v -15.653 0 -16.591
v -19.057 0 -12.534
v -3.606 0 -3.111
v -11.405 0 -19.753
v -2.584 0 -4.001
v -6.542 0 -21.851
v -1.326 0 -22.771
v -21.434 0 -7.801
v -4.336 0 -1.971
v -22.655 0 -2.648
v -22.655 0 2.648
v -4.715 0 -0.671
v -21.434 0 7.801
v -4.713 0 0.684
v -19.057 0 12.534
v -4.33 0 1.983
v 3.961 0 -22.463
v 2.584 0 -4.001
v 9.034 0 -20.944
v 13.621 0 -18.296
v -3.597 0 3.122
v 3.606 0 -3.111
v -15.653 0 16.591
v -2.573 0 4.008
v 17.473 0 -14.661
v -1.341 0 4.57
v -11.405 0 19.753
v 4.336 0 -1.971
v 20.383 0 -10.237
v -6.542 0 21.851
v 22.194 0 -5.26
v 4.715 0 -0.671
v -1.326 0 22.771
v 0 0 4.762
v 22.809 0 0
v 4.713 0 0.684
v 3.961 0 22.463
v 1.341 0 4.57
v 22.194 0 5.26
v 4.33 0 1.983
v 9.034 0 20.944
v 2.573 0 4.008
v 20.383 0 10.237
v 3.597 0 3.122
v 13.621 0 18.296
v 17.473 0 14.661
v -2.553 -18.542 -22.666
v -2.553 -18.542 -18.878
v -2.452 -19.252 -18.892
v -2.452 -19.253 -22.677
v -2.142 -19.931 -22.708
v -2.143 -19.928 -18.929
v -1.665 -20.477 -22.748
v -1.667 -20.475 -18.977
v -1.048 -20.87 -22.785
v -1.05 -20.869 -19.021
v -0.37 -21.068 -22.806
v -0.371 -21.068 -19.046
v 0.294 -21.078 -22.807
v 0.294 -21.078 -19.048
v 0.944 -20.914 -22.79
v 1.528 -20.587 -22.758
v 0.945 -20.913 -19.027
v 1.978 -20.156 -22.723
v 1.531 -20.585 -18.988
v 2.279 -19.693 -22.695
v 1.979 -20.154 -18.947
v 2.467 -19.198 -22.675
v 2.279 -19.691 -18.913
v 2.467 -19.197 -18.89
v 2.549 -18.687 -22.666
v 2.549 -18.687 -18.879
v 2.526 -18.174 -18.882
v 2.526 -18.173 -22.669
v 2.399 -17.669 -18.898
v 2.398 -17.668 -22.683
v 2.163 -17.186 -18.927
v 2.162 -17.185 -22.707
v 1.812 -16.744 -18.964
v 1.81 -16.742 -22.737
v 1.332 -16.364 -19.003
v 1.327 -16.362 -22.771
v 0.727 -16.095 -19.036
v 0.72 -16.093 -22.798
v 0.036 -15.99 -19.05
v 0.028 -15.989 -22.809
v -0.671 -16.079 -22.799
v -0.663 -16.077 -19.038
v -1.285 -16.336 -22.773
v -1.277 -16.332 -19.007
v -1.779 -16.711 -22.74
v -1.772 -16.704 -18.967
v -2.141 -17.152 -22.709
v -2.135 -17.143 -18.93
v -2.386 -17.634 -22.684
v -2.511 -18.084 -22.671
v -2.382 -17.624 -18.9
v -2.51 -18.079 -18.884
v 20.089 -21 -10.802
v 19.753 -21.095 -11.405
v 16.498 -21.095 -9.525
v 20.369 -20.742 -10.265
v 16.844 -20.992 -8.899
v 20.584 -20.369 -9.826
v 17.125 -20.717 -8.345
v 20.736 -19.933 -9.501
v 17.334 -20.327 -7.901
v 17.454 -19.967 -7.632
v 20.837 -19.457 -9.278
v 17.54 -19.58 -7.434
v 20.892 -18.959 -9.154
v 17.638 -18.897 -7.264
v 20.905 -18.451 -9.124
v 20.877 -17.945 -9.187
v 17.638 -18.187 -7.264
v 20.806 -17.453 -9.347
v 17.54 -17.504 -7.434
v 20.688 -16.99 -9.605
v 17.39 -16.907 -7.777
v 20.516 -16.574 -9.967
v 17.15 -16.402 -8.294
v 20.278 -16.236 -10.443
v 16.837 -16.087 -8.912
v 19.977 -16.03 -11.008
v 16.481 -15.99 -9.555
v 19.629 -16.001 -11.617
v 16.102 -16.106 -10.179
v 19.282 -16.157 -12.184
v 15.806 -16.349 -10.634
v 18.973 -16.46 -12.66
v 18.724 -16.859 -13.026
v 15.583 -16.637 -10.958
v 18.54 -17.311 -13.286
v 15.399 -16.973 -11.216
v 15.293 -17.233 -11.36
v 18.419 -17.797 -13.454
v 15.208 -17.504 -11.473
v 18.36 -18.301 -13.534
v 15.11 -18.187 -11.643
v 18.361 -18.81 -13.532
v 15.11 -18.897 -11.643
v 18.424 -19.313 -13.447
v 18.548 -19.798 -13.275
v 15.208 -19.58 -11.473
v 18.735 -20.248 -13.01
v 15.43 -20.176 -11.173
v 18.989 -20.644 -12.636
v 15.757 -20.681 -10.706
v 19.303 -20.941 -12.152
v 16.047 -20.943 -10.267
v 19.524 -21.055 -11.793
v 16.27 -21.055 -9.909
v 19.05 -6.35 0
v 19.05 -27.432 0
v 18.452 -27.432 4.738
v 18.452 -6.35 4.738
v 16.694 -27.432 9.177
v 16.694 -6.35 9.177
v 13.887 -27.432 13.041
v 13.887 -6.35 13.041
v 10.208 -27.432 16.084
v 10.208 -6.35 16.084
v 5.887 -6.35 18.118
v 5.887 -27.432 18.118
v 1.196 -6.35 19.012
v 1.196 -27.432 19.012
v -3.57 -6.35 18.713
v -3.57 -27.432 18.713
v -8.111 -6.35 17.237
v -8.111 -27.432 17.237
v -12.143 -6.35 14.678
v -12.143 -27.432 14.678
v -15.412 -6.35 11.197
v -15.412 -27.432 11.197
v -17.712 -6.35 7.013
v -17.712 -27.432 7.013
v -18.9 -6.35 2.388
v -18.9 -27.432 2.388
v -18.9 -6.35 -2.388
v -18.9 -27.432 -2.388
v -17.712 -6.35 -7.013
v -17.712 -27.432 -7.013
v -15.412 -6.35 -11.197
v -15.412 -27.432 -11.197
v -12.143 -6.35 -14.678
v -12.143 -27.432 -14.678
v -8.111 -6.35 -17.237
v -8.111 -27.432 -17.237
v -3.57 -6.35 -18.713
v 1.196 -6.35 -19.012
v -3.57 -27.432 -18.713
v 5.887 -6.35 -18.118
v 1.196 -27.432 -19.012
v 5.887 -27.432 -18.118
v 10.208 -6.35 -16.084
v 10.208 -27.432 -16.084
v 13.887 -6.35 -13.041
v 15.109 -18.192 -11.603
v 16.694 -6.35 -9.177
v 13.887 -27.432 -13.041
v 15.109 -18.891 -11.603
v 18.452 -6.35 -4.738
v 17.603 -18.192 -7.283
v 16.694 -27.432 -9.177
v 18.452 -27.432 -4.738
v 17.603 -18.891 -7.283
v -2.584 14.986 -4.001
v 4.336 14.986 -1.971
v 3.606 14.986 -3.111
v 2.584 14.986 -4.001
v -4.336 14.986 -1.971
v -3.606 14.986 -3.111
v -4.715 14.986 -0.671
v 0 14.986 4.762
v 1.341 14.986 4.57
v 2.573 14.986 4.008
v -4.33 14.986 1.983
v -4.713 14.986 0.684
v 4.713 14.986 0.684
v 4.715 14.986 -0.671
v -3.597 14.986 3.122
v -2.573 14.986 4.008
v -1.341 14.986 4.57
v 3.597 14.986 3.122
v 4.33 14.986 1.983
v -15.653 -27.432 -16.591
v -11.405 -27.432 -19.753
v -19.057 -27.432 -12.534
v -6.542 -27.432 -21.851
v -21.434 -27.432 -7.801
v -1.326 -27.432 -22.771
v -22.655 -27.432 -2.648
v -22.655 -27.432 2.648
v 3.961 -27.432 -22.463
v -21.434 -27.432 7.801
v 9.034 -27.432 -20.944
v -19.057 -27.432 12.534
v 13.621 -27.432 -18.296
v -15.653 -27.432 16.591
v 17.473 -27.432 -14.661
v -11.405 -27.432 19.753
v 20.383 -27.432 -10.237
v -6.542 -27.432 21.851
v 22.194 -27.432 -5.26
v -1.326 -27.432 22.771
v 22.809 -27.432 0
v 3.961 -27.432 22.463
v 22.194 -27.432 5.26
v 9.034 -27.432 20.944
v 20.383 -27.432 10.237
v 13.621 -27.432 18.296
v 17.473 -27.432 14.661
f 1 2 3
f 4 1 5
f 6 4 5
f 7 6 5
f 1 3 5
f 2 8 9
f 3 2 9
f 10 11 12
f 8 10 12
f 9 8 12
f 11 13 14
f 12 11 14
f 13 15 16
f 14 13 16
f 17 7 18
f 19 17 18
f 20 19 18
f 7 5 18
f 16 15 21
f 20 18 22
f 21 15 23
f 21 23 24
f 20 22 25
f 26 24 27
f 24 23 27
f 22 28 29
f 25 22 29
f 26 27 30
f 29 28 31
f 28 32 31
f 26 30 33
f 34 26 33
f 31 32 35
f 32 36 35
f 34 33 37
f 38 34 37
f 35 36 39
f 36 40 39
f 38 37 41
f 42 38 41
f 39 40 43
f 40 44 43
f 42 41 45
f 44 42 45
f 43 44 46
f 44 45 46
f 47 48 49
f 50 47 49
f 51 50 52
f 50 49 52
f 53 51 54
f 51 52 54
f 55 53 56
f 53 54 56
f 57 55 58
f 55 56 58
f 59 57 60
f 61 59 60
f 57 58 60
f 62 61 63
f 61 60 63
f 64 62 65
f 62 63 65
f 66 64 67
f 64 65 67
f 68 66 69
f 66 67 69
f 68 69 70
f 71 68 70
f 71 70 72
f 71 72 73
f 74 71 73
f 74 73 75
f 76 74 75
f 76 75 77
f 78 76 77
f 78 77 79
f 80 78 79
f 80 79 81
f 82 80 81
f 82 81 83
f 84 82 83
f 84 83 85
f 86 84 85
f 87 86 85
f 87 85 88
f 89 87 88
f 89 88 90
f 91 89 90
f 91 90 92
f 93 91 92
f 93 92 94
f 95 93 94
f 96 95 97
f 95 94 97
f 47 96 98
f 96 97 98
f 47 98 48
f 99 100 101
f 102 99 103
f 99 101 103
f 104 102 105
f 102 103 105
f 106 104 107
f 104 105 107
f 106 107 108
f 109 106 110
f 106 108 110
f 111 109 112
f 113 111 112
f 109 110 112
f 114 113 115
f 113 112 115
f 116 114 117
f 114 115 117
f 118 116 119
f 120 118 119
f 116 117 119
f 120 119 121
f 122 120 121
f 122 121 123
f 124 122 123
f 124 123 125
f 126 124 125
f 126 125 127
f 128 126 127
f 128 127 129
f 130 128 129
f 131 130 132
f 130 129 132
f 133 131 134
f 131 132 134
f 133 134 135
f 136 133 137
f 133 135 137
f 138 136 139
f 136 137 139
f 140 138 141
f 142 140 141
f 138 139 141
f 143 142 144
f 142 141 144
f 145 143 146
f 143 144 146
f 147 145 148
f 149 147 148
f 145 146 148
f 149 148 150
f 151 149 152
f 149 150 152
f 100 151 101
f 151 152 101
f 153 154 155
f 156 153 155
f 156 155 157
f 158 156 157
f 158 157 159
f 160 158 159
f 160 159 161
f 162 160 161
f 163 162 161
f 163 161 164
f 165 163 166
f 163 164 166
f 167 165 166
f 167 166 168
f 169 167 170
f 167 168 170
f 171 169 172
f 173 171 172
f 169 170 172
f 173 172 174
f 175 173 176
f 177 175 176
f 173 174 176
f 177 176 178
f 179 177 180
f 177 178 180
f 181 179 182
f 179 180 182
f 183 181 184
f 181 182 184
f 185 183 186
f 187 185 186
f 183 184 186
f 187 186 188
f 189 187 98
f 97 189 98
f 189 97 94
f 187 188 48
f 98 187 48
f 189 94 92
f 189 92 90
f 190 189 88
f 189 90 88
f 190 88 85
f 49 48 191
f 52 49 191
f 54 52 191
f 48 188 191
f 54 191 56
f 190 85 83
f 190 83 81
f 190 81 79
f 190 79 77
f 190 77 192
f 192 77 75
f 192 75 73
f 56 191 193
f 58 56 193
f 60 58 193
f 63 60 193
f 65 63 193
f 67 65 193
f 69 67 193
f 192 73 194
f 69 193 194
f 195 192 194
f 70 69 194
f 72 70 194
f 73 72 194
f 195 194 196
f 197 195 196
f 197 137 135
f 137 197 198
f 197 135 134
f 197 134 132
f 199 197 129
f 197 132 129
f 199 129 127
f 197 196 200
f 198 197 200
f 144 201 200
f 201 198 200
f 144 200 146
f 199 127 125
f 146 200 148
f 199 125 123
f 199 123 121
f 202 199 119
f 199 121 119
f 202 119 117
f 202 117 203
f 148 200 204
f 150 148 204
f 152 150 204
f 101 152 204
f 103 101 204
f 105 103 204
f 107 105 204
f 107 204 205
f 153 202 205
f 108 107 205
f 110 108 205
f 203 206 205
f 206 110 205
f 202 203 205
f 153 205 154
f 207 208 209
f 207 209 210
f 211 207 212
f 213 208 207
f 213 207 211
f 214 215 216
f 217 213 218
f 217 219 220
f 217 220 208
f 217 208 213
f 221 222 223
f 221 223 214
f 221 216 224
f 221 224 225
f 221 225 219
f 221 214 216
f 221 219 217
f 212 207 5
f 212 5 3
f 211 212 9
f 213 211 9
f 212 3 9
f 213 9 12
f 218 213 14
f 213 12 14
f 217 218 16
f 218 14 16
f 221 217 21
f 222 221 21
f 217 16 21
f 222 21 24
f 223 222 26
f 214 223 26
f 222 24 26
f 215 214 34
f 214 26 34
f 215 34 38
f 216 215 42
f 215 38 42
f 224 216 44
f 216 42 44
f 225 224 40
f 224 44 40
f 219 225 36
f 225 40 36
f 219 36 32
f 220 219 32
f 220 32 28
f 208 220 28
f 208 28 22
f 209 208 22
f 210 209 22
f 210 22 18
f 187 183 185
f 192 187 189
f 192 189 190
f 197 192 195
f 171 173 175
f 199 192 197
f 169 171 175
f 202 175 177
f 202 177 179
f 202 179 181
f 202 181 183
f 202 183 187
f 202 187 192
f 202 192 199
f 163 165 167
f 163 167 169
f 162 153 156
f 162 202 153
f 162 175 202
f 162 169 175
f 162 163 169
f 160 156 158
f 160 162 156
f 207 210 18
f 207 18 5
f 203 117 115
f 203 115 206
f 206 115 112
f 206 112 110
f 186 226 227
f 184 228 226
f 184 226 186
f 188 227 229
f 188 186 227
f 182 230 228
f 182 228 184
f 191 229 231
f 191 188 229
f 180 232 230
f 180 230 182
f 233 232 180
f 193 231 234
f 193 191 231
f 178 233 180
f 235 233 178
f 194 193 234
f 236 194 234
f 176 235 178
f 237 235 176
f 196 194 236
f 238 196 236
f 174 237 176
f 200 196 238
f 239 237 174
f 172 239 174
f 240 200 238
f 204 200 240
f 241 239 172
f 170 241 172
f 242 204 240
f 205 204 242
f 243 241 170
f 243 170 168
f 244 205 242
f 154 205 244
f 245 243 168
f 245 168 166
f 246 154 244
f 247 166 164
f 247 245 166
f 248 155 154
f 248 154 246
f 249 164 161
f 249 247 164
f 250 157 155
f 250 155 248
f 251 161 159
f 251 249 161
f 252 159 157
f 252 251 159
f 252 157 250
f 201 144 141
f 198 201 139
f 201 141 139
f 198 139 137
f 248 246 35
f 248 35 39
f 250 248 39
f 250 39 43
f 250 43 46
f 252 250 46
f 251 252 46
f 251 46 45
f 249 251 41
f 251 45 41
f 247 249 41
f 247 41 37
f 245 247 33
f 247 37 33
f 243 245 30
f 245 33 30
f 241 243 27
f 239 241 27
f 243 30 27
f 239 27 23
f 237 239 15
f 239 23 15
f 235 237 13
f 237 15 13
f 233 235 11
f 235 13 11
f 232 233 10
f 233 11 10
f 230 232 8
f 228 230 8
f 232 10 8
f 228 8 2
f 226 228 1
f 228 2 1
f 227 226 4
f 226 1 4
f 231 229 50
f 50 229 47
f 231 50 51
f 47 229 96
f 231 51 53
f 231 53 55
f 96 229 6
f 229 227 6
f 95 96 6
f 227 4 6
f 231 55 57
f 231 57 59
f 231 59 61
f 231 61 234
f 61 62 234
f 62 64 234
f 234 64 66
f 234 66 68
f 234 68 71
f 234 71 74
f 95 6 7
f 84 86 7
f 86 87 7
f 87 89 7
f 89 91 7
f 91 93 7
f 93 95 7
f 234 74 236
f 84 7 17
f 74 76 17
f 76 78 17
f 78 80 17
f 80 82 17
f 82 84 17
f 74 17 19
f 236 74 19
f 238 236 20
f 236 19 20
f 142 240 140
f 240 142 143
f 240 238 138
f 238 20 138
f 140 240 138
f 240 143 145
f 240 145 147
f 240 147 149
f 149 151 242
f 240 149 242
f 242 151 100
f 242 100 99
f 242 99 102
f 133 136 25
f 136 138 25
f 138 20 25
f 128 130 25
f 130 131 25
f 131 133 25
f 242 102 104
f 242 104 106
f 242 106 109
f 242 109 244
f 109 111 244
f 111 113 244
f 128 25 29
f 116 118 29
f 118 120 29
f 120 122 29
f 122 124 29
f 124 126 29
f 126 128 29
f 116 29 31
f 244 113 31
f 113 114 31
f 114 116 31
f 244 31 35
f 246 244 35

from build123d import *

# Parameters (mm, degrees)
F0_R      = 22.8092
F1_DEPTH  = 27.432
F3_DEPTH  = 14.986
F4_R      = 19.05
F5_DEPTH  = 21.082
F8_D      = 5.1054
F8_DEPTH  = 7.5692
F8_START  = 0.1432934
F8_TIP    = 1.5338169022
F12_D     = 5.1054
F12_DEPTH = 3.7592
F12_START = 0.1432934
F12_TIP   = 1.5338169022


with BuildPart() as f1:
    # F0 (on Front) → F1 (new body)
    with BuildSketch(Plane.XZ):
        Circle(F0_R)
    extrude(amount=F1_DEPTH)

    # F2 (on face) → F3 (join)
    with BuildSketch(Plane(origin=(0, 0, 0), x_dir=(-1, 0, 0), z_dir=(0, 1, 0))):
        with BuildLine():
            Line((0, -4.0005), (2.5840677236, -4.0005))
            ThreePointArc((2.5840677236, -4.0005), (0, 4.7625), (-2.5840677236, -4.0005))
            Line((-2.5840677236, -4.0005), (0, -4.0005))
        make_face()
    extrude(amount=F3_DEPTH)

    # F4 (on face) → F5 (cut)
    with BuildSketch(Plane.XZ.offset(27.432)):
        Circle(F4_R)
    extrude(amount=-F5_DEPTH, mode=Mode.SUBTRACT)

    # F8
    # its depths count from where the whole tool has entered the part; down to there all is cleared
    with Locations(Plane(origin=(0, 0, -22.8092), x_dir=(1, 0, 0), z_dir=(0, 0, -1)).offset(-F8_START)):
        with Locations((0, 18.542)):
            Hole(F8_D / 2, depth=F8_DEPTH)
            with Locations((0, 0, -(F8_DEPTH + F8_TIP / 2))):  # 118° drill point
                Cone(0, F8_D / 2, F8_TIP, mode=Mode.SUBTRACT)

    # F12
    # its depths count from where the whole tool has entered the part; down to there all is cleared
    with Locations(Plane(origin=(19.75334664, 0, -11.4046), x_dir=(0, 1, 0), z_dir=(0.8660254038, 0, -0.5)).offset(-F12_START)):
        with Locations((-18.542, 0)):
            Hole(F12_D / 2, depth=F12_DEPTH)
            with Locations((0, 0, -(F12_DEPTH + F12_TIP / 2))):  # 118° drill point
                Cone(0, F12_D / 2, F12_TIP, mode=Mode.SUBTRACT)


solid = f1.part
